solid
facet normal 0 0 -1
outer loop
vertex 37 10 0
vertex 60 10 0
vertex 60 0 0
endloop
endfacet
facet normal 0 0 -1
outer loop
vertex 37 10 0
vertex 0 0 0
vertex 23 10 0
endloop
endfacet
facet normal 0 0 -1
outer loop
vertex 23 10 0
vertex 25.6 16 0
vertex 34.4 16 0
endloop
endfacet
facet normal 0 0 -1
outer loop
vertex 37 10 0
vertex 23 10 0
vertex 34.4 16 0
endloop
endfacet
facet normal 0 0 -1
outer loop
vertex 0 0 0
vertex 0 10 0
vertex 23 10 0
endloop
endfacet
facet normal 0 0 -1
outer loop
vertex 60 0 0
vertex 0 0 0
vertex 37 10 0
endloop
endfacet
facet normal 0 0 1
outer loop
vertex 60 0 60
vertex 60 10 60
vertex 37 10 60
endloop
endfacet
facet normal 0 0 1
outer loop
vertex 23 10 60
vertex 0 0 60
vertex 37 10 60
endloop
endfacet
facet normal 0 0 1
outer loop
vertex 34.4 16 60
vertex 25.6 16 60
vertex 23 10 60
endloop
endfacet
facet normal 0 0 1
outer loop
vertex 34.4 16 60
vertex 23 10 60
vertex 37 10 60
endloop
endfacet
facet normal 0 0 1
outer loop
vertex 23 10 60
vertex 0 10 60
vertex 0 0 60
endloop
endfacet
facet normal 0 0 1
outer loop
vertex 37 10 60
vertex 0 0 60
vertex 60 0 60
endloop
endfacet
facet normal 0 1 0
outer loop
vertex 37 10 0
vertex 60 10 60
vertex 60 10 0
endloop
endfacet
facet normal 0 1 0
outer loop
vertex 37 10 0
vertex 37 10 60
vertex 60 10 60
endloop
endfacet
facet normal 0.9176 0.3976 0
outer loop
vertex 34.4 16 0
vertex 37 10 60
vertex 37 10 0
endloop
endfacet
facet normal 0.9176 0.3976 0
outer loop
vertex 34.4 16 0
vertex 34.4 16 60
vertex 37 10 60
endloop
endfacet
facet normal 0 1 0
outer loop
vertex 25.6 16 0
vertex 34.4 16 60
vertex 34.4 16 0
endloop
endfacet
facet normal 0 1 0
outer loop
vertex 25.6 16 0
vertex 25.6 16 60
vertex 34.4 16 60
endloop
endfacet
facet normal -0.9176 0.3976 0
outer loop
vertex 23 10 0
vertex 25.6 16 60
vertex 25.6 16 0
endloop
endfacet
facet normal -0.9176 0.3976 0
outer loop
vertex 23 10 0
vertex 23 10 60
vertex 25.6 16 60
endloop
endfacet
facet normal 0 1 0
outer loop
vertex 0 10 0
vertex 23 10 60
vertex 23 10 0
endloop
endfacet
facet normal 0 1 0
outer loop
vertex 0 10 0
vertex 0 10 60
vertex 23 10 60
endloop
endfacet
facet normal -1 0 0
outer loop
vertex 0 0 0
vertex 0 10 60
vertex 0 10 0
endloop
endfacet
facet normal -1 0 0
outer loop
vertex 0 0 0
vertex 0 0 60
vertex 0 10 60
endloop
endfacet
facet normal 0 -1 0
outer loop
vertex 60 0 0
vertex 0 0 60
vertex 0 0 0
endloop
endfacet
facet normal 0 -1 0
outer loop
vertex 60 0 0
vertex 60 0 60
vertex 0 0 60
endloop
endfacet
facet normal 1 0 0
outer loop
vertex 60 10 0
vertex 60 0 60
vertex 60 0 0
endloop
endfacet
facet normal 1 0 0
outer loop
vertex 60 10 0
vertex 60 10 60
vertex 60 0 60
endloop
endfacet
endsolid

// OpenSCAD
$fn = 32;

// ----------------------------------------------------------------------
// V guide rail: dovetail, 60 mm wide
// ----------------------------------------------------------------------

// --- parameters (mm) ---
rail_w = 60;              // rail width, X
base_t = 10;              // base plate thickness
v_depth = 6;              // V feature depth / height
v_half_w = 7;             // half width of the V at the base face
plate_t = 60;             // rail length, Z (the extrusion height)
top_half_w = 4.4;         // half width at the dovetail top

dovetail_base = 2 * v_half_w;  // dovetail width at the base
dovetail_top = 2 * top_half_w;  // dovetail width at the top

profile = [[0, 0], [60, 0], [60, 10], [37, 10], [34.4, 16], [25.6, 16], [23, 10], [0, 10]];  // primary outline, 8 points, counter clockwise

// --- the one profile operation ---
linear_extrude(height = plate_t) polygon(points = profile);
